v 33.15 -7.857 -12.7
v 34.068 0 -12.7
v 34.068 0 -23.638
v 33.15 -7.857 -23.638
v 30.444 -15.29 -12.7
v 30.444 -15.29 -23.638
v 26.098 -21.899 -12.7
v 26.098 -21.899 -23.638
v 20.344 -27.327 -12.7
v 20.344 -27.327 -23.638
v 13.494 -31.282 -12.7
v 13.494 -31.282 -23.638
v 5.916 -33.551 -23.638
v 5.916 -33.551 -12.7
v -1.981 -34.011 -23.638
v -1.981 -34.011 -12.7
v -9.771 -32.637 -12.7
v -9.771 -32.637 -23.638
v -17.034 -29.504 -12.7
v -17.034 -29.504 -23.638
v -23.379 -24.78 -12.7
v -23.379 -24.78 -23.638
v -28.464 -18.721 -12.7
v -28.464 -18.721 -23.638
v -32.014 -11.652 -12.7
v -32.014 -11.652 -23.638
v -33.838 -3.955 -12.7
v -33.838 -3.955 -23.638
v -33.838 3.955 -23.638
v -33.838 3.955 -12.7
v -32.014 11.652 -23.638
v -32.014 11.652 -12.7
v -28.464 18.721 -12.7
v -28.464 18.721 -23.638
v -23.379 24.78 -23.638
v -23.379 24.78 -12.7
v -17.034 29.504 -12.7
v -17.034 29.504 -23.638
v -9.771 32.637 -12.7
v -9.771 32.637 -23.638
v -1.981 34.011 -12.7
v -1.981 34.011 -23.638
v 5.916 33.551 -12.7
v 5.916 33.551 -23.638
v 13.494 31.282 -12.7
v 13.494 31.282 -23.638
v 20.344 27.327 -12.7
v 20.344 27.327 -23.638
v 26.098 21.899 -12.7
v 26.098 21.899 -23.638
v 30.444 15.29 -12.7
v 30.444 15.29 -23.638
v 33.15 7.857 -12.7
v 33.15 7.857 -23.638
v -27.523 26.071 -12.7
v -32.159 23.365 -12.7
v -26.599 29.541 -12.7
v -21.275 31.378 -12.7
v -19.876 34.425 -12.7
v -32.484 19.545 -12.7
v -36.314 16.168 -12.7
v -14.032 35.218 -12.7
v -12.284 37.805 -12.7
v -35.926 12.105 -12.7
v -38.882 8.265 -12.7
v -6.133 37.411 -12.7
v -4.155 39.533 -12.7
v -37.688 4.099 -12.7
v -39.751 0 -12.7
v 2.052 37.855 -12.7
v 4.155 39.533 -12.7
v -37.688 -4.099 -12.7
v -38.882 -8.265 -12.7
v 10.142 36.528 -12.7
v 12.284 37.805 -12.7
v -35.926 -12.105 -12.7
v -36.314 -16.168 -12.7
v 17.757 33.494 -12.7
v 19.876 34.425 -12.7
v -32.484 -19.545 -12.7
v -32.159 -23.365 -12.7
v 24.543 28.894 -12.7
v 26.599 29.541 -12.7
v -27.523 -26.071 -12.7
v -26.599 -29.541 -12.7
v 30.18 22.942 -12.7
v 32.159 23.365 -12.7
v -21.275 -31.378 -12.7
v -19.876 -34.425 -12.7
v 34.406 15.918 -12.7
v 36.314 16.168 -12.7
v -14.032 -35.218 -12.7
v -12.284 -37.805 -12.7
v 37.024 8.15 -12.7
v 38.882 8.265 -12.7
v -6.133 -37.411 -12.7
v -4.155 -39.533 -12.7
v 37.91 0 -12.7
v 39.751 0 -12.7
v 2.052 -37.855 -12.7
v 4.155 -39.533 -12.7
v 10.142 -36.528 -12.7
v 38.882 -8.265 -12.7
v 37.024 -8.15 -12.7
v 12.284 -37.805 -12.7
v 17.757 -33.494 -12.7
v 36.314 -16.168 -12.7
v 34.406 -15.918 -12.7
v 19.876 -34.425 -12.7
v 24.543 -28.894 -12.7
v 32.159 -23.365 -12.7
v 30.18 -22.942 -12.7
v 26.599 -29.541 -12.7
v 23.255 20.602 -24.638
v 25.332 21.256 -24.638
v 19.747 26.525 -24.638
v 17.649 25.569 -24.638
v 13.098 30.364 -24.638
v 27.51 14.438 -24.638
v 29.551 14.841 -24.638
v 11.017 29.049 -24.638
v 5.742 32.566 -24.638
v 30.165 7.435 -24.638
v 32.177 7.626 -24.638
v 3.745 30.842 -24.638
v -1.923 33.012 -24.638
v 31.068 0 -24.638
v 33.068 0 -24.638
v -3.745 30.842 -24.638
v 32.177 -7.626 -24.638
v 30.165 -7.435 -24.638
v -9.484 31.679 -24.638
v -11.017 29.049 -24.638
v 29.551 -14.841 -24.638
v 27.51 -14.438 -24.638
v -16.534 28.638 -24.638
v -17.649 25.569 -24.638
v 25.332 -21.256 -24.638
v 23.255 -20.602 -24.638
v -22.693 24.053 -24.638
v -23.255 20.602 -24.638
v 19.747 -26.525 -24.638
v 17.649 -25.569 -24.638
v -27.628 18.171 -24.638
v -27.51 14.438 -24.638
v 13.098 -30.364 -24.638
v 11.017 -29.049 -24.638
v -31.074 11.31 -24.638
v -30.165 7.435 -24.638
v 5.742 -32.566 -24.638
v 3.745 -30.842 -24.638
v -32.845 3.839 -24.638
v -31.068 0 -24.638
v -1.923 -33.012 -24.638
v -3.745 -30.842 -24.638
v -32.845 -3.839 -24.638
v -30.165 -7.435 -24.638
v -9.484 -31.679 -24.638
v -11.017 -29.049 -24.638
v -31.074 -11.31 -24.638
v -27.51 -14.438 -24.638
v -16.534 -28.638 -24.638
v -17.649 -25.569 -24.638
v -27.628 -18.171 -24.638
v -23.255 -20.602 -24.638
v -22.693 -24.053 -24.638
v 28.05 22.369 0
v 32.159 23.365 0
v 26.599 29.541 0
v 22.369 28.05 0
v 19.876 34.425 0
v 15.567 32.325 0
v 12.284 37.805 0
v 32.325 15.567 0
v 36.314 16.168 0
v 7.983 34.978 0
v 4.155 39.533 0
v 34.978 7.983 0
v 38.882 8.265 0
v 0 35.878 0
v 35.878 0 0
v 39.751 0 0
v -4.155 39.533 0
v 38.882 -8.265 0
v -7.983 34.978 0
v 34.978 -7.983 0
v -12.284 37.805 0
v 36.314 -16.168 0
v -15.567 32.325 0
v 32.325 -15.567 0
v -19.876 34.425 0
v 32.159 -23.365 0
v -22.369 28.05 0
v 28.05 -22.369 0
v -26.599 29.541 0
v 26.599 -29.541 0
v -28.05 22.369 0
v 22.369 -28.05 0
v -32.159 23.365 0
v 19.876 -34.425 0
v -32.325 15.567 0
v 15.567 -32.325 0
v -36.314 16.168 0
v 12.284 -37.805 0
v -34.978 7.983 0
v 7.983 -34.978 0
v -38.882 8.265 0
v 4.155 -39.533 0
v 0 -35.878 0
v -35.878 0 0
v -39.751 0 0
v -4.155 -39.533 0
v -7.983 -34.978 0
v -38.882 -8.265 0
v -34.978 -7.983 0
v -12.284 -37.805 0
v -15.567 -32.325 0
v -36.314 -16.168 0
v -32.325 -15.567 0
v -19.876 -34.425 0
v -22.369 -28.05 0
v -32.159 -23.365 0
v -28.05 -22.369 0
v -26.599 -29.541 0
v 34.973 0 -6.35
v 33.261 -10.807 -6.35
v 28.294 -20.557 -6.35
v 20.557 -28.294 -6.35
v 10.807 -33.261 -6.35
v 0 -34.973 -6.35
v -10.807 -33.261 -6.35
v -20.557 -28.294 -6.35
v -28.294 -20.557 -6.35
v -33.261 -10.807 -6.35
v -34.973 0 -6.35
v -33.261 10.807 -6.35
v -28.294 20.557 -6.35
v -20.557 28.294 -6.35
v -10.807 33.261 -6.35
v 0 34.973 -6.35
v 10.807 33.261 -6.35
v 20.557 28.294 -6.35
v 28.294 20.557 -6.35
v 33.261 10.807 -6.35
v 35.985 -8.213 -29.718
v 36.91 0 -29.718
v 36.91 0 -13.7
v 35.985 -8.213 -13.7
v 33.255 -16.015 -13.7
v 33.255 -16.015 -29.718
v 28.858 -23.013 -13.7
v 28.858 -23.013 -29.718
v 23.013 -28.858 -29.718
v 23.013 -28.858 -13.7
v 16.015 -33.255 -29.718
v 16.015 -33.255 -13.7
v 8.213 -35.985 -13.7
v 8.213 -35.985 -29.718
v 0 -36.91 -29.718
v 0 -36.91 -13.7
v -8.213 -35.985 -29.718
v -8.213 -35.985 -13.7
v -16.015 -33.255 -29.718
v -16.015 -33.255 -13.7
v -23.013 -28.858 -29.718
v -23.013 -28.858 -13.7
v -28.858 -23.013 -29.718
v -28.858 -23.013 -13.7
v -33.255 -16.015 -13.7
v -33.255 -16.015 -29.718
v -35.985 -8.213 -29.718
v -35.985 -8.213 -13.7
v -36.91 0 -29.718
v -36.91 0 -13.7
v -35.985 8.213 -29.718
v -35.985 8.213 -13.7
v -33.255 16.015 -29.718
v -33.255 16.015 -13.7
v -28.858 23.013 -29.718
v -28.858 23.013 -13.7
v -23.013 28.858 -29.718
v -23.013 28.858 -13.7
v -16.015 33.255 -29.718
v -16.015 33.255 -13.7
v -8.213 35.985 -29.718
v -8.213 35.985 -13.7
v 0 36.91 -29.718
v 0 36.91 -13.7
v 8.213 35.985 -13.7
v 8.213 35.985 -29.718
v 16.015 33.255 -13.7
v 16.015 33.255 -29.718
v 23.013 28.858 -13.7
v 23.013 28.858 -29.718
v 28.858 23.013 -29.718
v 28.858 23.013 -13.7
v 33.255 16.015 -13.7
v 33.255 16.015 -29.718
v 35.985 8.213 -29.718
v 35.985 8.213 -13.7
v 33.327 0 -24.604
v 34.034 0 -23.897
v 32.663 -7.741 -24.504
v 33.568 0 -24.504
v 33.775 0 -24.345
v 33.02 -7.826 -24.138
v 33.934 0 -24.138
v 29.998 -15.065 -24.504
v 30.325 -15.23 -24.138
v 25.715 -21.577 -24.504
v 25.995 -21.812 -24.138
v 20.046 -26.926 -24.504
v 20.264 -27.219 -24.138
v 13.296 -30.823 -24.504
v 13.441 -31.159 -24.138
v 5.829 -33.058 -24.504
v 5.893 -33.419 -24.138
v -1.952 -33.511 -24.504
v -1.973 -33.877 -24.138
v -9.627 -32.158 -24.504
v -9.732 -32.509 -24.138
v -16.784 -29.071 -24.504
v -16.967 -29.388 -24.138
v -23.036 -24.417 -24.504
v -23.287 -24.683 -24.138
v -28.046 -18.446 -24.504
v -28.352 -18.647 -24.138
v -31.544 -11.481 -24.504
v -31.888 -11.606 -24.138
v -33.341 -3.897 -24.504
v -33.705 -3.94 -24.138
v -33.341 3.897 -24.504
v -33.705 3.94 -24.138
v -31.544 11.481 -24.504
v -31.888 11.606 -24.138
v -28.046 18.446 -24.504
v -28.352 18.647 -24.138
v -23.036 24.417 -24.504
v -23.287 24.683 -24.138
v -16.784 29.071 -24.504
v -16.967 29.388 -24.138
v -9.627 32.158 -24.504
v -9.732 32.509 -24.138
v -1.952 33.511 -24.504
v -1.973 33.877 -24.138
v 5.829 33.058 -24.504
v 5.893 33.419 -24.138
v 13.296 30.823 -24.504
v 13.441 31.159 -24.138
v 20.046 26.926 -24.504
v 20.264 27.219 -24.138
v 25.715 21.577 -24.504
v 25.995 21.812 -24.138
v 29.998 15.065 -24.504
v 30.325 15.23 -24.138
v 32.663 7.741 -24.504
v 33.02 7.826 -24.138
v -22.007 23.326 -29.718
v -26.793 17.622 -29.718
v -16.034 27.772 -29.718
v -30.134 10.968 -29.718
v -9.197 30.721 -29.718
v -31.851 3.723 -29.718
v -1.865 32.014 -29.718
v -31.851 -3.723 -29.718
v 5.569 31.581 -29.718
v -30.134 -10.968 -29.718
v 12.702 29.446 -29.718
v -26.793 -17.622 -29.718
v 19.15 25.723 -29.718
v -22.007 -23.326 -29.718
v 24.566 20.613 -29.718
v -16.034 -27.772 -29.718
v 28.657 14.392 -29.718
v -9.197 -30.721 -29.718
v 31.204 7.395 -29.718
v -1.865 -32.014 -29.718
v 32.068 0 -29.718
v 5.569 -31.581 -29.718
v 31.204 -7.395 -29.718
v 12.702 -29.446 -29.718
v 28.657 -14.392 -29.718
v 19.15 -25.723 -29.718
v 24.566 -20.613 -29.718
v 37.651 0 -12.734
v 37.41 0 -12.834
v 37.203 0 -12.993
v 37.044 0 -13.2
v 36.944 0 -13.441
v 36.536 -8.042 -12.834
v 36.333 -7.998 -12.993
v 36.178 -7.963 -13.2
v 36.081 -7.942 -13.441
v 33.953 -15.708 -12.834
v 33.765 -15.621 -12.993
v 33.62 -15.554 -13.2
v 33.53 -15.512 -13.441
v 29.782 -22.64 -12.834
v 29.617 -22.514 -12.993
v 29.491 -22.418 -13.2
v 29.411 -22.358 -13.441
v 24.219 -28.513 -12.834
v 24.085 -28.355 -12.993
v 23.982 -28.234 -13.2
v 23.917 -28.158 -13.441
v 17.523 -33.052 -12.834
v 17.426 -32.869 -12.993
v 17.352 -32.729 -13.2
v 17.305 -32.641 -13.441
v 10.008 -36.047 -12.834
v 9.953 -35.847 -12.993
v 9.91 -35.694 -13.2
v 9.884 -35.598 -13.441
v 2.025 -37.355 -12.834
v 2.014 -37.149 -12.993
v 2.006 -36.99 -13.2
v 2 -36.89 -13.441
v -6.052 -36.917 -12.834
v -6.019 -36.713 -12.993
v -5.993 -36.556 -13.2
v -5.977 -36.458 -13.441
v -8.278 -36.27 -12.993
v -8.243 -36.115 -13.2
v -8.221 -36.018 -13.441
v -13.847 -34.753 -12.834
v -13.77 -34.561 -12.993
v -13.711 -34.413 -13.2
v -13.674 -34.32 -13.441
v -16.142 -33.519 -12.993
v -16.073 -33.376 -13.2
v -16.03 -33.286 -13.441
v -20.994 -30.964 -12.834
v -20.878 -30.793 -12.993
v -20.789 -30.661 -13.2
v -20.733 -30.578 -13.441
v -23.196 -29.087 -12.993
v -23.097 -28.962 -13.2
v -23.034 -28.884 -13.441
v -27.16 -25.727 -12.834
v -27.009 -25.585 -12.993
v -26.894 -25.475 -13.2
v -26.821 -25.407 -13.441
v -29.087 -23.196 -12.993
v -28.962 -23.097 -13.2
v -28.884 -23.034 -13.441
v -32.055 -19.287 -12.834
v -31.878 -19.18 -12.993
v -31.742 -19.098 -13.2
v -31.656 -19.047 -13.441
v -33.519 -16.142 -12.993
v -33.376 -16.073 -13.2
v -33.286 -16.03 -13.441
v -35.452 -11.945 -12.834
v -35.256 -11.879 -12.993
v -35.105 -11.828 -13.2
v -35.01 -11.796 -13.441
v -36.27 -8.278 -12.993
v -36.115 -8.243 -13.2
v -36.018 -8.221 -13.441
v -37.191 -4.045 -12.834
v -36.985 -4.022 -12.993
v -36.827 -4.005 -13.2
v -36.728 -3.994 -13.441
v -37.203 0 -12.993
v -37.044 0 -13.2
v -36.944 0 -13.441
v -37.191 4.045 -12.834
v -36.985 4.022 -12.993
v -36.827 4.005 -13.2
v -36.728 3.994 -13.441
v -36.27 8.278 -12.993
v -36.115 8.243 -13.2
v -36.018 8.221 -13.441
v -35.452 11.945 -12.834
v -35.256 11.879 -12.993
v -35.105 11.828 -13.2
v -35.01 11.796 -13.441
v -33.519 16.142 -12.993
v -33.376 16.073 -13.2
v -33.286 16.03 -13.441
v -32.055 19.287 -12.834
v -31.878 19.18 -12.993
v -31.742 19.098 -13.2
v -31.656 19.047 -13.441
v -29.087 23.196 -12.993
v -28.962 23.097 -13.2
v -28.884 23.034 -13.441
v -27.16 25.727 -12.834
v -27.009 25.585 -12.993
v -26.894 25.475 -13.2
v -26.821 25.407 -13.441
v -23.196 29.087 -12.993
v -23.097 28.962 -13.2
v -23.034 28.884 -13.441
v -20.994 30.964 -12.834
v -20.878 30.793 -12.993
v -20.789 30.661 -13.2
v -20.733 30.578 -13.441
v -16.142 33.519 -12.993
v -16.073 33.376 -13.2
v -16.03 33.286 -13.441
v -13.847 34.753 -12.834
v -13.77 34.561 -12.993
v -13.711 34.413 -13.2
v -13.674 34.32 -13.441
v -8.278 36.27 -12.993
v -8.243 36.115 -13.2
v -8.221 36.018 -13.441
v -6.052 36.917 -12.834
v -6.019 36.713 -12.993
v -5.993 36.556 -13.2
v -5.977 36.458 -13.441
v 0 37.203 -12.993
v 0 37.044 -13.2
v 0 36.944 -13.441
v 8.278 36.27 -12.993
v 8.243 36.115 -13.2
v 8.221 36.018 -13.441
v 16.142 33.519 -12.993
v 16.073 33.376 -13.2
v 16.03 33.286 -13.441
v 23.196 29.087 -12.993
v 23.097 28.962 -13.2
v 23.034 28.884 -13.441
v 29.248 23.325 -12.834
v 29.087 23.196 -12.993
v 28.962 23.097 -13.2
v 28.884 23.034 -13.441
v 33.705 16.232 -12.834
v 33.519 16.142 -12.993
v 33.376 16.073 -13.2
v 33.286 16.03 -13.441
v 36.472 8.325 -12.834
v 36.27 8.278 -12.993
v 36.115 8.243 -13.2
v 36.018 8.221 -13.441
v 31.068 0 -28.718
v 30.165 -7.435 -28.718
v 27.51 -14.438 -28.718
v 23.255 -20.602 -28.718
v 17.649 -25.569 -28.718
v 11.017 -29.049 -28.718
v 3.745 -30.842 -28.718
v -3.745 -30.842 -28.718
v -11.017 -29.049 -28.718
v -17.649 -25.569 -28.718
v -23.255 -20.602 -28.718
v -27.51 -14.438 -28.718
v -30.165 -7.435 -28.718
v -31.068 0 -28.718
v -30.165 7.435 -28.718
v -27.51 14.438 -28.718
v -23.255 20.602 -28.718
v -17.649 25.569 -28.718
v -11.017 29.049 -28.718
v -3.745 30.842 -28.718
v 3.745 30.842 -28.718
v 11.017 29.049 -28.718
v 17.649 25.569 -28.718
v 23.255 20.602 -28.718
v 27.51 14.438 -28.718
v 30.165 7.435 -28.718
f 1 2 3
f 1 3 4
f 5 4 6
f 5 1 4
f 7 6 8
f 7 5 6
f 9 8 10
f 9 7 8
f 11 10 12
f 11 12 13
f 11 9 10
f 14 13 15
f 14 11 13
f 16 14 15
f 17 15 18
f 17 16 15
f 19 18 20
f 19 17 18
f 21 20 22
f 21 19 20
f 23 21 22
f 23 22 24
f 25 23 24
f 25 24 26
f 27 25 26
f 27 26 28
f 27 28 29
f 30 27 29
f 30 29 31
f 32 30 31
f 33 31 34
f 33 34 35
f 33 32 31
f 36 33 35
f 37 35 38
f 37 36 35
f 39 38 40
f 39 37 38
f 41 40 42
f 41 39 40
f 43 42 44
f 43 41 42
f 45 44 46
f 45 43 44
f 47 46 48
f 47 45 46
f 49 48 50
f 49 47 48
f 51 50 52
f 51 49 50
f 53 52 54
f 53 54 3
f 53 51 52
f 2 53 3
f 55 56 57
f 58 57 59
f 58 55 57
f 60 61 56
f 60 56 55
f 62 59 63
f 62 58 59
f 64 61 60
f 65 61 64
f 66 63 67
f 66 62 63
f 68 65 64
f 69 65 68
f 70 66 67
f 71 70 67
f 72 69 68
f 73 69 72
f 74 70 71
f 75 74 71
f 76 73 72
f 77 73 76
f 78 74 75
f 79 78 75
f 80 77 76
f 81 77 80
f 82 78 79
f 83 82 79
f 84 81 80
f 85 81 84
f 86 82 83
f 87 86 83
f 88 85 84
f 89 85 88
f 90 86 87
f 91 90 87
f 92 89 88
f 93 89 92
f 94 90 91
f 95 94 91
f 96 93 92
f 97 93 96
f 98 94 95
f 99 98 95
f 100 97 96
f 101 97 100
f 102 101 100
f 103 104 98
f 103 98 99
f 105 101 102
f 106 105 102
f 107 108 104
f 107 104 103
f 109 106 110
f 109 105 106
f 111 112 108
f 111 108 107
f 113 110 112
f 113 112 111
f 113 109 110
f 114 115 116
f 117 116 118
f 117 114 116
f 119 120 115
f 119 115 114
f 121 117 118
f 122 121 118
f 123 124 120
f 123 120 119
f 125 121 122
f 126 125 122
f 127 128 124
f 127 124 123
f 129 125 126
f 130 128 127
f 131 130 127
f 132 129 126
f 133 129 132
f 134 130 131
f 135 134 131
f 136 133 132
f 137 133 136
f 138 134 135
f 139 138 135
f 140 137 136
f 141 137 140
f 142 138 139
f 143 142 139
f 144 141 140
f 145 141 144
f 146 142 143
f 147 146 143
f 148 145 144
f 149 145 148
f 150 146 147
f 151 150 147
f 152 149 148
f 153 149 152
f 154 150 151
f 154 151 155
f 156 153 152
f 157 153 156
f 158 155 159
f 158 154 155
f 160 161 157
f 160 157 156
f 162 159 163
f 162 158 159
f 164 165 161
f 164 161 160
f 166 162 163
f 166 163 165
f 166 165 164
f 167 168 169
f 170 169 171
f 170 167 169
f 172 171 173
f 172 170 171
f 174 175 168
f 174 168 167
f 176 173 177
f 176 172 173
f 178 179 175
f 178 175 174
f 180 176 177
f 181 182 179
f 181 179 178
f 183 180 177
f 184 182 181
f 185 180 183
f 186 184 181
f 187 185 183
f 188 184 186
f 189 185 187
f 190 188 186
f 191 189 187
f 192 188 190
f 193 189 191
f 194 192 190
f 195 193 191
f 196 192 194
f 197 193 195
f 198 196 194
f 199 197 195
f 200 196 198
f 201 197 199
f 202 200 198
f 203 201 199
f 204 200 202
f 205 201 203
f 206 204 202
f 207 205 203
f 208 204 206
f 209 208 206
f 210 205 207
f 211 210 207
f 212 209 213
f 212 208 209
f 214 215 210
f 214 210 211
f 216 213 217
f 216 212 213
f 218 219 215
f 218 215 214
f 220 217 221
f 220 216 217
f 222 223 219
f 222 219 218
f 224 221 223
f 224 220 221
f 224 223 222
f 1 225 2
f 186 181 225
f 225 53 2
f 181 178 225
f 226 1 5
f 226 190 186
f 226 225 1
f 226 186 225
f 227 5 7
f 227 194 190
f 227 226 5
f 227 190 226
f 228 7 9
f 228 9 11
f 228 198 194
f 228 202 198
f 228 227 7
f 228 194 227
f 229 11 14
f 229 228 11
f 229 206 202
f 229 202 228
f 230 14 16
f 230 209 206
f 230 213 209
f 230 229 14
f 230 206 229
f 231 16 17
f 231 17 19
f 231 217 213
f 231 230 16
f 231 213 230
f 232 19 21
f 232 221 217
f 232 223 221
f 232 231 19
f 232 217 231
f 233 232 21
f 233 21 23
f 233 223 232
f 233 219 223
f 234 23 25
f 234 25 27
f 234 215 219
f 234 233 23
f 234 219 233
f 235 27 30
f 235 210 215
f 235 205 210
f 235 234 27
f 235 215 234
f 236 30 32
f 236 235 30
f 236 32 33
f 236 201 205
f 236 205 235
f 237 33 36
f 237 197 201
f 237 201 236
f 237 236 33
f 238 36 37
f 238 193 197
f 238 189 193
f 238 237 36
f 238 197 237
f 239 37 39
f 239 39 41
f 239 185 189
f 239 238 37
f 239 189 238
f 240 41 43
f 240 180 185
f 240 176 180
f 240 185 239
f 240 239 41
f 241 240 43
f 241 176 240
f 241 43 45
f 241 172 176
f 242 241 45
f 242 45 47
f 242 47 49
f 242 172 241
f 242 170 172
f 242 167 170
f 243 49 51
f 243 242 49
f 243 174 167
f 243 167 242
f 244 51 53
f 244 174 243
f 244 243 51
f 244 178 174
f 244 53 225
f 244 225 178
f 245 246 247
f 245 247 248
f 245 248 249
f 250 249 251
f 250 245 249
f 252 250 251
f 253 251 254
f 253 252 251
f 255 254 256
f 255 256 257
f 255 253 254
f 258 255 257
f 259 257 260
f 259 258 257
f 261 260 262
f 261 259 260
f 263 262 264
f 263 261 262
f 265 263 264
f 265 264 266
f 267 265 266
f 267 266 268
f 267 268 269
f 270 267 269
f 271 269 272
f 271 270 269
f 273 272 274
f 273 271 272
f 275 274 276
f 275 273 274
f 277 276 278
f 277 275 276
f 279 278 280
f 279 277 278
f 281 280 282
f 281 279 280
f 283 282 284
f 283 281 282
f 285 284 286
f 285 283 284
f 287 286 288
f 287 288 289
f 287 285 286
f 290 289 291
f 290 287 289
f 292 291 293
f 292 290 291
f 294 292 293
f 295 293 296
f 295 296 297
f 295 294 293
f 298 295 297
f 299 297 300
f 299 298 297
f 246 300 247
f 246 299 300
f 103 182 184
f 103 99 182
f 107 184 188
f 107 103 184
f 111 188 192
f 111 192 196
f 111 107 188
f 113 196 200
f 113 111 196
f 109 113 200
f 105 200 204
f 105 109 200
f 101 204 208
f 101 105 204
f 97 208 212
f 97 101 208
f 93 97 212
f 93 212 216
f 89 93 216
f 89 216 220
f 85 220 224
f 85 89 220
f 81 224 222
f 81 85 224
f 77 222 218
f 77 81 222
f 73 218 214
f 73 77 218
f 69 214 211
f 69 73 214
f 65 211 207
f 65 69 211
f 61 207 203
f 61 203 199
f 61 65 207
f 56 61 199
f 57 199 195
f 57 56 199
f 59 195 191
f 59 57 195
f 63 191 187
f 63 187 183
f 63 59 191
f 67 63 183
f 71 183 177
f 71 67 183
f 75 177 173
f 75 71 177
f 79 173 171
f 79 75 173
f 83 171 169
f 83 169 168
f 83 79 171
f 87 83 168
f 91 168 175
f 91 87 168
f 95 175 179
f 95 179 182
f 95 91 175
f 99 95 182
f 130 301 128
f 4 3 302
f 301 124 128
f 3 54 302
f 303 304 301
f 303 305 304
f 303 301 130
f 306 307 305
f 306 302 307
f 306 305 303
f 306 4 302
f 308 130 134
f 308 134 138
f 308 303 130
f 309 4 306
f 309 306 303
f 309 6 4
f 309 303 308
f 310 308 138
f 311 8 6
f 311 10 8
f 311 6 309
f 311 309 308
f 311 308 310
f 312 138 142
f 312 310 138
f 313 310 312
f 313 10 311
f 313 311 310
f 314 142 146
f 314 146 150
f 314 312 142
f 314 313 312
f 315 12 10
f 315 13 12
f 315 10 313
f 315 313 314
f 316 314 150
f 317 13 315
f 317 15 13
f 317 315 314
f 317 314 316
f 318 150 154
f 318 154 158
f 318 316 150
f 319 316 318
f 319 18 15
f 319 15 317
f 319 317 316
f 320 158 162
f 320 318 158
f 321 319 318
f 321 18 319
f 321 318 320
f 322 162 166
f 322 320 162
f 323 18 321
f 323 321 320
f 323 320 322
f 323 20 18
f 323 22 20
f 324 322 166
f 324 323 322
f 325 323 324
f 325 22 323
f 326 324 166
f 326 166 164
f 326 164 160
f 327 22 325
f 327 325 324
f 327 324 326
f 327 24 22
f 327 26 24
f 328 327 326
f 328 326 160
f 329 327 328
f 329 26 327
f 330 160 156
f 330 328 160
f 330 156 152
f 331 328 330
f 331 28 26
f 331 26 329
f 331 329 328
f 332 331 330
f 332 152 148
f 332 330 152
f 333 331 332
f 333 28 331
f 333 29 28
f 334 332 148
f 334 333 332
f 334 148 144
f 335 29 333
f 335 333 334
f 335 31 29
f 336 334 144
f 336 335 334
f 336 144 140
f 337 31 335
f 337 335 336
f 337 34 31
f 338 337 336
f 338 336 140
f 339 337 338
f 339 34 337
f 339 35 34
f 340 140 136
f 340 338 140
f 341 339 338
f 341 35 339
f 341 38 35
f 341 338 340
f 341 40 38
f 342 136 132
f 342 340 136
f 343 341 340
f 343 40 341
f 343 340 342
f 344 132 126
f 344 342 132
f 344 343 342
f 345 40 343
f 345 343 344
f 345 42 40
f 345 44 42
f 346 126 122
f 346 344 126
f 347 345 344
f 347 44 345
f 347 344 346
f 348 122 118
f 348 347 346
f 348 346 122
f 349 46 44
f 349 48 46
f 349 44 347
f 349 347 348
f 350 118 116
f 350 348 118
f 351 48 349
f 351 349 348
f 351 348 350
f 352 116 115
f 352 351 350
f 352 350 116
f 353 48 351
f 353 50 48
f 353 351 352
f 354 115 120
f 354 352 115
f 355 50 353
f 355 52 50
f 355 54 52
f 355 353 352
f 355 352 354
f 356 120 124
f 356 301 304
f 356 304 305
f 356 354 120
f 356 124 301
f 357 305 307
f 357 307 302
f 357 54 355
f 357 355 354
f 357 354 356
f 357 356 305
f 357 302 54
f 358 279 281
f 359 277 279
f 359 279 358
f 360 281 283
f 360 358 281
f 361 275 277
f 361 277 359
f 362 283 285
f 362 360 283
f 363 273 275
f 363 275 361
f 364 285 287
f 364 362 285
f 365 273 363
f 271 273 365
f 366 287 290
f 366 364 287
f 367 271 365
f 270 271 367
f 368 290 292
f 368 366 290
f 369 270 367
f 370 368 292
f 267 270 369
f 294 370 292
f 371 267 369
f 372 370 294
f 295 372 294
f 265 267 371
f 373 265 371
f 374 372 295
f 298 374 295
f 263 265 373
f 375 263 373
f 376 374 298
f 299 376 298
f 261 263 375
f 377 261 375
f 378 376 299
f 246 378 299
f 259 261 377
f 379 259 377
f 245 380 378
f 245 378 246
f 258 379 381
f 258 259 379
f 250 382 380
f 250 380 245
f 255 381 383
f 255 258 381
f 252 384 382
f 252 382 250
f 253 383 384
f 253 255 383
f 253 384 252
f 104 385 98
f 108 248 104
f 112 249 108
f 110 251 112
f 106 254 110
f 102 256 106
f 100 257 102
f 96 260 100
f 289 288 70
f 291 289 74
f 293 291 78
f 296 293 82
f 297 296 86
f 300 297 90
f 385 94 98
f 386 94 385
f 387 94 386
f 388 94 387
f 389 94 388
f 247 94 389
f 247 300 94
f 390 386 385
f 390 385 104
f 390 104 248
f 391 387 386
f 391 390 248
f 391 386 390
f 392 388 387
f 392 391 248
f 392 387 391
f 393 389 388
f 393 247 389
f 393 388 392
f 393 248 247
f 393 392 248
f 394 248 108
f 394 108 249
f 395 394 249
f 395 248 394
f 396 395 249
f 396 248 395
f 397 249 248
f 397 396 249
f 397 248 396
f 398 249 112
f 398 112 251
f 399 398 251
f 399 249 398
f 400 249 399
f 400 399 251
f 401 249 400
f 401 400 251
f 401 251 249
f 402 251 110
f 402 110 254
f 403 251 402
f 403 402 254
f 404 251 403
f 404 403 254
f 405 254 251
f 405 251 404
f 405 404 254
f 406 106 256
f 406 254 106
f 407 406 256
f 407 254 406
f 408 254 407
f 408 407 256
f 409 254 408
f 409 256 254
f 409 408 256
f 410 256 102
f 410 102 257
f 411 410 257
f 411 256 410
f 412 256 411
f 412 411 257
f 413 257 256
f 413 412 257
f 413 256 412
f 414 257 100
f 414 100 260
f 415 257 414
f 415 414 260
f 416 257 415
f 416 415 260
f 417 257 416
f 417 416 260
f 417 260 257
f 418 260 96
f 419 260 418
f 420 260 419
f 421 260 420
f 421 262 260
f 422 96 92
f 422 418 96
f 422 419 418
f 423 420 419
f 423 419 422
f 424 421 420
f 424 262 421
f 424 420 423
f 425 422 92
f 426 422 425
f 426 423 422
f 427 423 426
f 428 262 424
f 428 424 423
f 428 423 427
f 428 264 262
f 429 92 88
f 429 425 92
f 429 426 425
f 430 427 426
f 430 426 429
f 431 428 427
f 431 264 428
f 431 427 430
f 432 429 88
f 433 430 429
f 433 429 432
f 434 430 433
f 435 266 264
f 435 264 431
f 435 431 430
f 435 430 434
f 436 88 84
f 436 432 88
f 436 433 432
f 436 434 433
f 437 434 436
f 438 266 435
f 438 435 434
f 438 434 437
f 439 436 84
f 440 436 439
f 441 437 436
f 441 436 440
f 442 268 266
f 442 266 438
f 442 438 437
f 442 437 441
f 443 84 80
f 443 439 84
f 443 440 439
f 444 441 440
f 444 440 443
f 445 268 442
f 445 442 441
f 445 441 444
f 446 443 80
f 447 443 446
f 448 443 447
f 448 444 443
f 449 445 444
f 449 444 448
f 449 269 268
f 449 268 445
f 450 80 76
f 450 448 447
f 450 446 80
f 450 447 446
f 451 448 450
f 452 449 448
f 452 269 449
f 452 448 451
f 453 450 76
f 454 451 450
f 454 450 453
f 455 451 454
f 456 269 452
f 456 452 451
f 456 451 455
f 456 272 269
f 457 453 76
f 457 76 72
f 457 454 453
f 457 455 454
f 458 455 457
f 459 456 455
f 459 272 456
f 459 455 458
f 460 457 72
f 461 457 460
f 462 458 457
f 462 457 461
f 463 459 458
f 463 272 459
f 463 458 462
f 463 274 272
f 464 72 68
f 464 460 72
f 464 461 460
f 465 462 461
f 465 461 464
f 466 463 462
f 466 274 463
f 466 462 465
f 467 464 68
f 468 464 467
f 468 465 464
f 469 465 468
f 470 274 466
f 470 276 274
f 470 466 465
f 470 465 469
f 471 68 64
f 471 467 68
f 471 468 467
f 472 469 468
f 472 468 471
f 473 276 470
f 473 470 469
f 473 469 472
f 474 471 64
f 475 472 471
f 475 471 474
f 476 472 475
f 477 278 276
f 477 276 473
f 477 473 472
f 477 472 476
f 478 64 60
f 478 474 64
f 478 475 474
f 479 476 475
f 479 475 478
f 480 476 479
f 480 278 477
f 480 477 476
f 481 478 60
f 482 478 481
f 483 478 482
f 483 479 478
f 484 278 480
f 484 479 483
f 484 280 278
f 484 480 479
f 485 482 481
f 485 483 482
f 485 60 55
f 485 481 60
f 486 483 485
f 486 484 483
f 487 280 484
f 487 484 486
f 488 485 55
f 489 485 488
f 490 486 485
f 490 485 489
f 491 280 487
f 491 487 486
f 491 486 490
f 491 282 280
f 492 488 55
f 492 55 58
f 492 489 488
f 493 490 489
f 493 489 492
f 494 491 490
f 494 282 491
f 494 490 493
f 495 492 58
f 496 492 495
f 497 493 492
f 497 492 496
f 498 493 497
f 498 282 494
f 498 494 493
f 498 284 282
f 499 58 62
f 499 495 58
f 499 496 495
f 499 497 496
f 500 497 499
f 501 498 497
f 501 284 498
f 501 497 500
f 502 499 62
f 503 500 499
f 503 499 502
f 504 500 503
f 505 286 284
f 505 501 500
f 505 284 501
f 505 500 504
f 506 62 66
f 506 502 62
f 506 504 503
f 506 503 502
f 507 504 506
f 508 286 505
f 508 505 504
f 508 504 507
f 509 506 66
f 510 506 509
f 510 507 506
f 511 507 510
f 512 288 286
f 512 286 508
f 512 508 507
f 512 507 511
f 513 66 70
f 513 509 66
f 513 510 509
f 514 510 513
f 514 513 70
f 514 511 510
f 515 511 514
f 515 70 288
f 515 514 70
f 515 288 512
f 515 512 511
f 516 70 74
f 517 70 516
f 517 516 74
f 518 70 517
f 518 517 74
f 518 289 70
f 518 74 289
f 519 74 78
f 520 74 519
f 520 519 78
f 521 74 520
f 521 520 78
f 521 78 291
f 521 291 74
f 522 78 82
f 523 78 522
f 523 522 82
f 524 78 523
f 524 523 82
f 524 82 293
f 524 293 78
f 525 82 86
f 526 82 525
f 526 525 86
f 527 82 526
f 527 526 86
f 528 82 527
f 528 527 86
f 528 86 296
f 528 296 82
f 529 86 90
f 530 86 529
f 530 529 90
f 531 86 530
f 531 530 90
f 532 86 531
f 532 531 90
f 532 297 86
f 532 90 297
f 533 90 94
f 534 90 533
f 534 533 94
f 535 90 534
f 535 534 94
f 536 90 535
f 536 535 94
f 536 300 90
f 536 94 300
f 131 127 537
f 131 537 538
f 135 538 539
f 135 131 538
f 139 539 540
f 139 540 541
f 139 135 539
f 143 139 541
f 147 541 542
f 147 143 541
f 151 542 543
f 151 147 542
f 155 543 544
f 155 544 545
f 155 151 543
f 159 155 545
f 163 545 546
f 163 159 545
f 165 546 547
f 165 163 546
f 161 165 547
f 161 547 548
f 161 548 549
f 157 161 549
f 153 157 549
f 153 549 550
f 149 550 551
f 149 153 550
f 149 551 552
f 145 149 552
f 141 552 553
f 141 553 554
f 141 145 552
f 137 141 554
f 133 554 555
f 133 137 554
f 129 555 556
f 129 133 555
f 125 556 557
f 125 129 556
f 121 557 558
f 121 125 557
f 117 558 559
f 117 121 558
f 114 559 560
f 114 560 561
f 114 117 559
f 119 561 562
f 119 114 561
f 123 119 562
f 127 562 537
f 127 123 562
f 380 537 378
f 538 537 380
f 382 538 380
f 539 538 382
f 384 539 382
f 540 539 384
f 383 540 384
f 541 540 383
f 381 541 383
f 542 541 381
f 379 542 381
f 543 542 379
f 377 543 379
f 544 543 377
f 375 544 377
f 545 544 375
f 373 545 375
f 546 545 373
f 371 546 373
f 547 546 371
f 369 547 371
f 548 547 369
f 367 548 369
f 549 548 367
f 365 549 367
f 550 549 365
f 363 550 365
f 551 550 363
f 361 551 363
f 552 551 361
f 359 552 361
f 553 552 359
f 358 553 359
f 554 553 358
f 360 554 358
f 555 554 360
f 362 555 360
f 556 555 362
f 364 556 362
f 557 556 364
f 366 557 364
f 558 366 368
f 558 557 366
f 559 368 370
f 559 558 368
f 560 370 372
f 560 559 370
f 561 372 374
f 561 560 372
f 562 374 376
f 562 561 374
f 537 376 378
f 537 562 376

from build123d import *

# Parameters (mm, degrees)
FILLET1_R     = 1
CHAMFER1_SIZE = 1
FILLET2_R     = 1


with BuildPart() as part:
    # Sketch1 → Revolve1 (revolve)
    with BuildSketch(Plane(origin=(0, 0, 0), x_dir=(1, 0, 0), z_dir=(0, 1, 0))):
        Polygon((34.068196428, 24.638), (34.068196428, 12.7), (35.8775, 0), (39.751, 0), (39.751, 12.7), (36.910196428, 12.7), (36.910196428, 29.718), (31.068196428, 29.718), (31.068196428, 24.638), align=None)
    revolve(axis=Axis((0, 0, 0), (0, 0, -1)))

    # Fillet1
    fillet1_edges = [part.edges().sort_by_distance(p)[0] for p in [
        (-36.910196428, 0, -12.7),
    ]]
    fillet(fillet1_edges, radius=FILLET1_R)

    # Chamfer1
    chamfer1_edges = [part.edges().sort_by_distance(p)[0] for p in [
        (-31.068196428, 0, -29.718),
    ]]
    chamfer(chamfer1_edges, length=CHAMFER1_SIZE)

    # Fillet2
    fillet2_edges = [part.edges().sort_by_distance(p)[0] for p in [
        (-34.068196428, 0, -24.638),
    ]]
    fillet(fillet2_edges, radius=FILLET2_R)


solid = part.part
